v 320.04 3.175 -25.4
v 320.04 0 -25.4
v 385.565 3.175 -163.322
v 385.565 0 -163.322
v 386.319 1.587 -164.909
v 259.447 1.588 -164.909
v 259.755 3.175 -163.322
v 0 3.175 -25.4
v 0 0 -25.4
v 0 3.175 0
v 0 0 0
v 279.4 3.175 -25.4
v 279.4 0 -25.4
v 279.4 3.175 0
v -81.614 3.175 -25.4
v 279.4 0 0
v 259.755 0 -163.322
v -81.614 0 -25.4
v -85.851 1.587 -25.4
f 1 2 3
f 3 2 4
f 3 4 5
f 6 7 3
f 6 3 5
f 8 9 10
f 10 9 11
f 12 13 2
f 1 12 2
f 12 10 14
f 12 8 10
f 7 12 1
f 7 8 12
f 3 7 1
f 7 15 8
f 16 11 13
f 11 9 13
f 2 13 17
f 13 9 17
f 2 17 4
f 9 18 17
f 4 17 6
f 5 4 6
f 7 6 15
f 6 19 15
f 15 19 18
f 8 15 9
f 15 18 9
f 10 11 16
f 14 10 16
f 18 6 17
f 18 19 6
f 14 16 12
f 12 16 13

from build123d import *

# Parameters (mm, degrees)
BOSS_EXTRUDE1_DEPTH = 3.175
CHAMFER1_SIZE       = 1.778


with BuildPart() as part:
    # Sketch1 → Boss-Extrude1 (new body)
    with BuildSketch(Plane(origin=(0, 0, 0), x_dir=(1, 0, 0), z_dir=(0, 1, 0))):
        Polygon((279.4, 25.4), (320.04, 25.4), (386.409633422, 165.1), (259.409633422, 165.1), (-86.36, 25.4), (0, 25.4), (0, 0), (279.4, 0), align=None)
    extrude(amount=BOSS_EXTRUDE1_DEPTH)

    # Chamfer1
    # the kernel refuses this chamfer: 1.778 mm, written as the material it takes off along each edge
    with BuildSketch(Plane(origin=(263.649137419, 3.175, -166.812870799), x_dir=(-0.01030013667007983, -0.9996219169112964, -0.02549373286050588), z_dir=(-0.9271838545667884, 0, 0.3746065934159097))) as chamfer1_piece_1:
        Polygon((CHAMFER1_SIZE * 0.999621916911, CHAMFER1_SIZE * 0.0274958766106), (-CHAMFER1_SIZE * 0.0274958766106, CHAMFER1_SIZE * 0.999621916911), (0, 0), align=None)
    extrude(amount=382.069467314, mode=Mode.SUBTRACT)
    with BuildSketch(Plane(origin=(263.649137419, 0, -166.812870799), x_dir=(-0.01030013667007983, 0.9996219169112964, -0.02549373286050588), z_dir=(-0.9271838545667884, 0, 0.3746065934159097))) as chamfer1_piece_2:
        Polygon((CHAMFER1_SIZE * 0.999621916911, -CHAMFER1_SIZE * 0.0274958766106), (-CHAMFER1_SIZE * 0.0274958766106, -CHAMFER1_SIZE * 0.999621916911), (0, 0), align=None)
    extrude(amount=382.069467314, mode=Mode.SUBTRACT)

    # Chamfer2
    # the kernel refuses this chamfer: 1.778 mm, written as the material it takes off along each edge
    with BuildSketch(Plane(origin=(397.383519069, 3.175, -165.1), x_dir=(0, 0.027495876610586497, 0.9996219169112968), z_dir=(-1, 0, 0))) as chamfer2_piece_1:
        with BuildLine():
            Line((1.828980941, 0), (-0.100540841, -1.826215437))
            Line((-0.100540841, -1.826215437), (-0.136087397, -1.825237684))
            ThreePointArc((-0.136087397, -1.825237684), (-0.060681766, -0.912821341), (-0.035546555, 0.000977753))
            Line((-0.035546555, 0.000977753), (0.000977753, 0.035546555))
            ThreePointArc((0.000977753, 0.035546555), (0.914776848, 0.010411345), (1.829958694, 0.035546555))
            Line((1.829958694, 0.035546555), (1.828980941, 0))
        make_face()
    extrude(amount=144.201458677, mode=Mode.SUBTRACT)
    with BuildSketch(Plane(origin=(397.383519069, 0, -165.1), x_dir=(0, -0.02749587661058638, 0.9996219169112968), z_dir=(-1, 0, 0))) as chamfer2_piece_2:
        with BuildLine():
            Line((1.828980941, 0), (-0.100540841, 1.826215437))
            Line((-0.100540841, 1.826215437), (-0.136087397, 1.825237684))
            ThreePointArc((-0.136087397, 1.825237684), (-0.060681766, 0.912821341), (-0.035546555, -0.000977753))
            Line((-0.035546555, -0.000977753), (0.000977753, -0.035546555))
            ThreePointArc((0.000977753, -0.035546555), (0.914776848, -0.010411345), (1.829958694, -0.035546555))
            Line((1.829958694, -0.035546555), (1.828980941, 0))
        make_face()
    extrude(amount=144.201458677, mode=Mode.SUBTRACT)


solid = part.part
